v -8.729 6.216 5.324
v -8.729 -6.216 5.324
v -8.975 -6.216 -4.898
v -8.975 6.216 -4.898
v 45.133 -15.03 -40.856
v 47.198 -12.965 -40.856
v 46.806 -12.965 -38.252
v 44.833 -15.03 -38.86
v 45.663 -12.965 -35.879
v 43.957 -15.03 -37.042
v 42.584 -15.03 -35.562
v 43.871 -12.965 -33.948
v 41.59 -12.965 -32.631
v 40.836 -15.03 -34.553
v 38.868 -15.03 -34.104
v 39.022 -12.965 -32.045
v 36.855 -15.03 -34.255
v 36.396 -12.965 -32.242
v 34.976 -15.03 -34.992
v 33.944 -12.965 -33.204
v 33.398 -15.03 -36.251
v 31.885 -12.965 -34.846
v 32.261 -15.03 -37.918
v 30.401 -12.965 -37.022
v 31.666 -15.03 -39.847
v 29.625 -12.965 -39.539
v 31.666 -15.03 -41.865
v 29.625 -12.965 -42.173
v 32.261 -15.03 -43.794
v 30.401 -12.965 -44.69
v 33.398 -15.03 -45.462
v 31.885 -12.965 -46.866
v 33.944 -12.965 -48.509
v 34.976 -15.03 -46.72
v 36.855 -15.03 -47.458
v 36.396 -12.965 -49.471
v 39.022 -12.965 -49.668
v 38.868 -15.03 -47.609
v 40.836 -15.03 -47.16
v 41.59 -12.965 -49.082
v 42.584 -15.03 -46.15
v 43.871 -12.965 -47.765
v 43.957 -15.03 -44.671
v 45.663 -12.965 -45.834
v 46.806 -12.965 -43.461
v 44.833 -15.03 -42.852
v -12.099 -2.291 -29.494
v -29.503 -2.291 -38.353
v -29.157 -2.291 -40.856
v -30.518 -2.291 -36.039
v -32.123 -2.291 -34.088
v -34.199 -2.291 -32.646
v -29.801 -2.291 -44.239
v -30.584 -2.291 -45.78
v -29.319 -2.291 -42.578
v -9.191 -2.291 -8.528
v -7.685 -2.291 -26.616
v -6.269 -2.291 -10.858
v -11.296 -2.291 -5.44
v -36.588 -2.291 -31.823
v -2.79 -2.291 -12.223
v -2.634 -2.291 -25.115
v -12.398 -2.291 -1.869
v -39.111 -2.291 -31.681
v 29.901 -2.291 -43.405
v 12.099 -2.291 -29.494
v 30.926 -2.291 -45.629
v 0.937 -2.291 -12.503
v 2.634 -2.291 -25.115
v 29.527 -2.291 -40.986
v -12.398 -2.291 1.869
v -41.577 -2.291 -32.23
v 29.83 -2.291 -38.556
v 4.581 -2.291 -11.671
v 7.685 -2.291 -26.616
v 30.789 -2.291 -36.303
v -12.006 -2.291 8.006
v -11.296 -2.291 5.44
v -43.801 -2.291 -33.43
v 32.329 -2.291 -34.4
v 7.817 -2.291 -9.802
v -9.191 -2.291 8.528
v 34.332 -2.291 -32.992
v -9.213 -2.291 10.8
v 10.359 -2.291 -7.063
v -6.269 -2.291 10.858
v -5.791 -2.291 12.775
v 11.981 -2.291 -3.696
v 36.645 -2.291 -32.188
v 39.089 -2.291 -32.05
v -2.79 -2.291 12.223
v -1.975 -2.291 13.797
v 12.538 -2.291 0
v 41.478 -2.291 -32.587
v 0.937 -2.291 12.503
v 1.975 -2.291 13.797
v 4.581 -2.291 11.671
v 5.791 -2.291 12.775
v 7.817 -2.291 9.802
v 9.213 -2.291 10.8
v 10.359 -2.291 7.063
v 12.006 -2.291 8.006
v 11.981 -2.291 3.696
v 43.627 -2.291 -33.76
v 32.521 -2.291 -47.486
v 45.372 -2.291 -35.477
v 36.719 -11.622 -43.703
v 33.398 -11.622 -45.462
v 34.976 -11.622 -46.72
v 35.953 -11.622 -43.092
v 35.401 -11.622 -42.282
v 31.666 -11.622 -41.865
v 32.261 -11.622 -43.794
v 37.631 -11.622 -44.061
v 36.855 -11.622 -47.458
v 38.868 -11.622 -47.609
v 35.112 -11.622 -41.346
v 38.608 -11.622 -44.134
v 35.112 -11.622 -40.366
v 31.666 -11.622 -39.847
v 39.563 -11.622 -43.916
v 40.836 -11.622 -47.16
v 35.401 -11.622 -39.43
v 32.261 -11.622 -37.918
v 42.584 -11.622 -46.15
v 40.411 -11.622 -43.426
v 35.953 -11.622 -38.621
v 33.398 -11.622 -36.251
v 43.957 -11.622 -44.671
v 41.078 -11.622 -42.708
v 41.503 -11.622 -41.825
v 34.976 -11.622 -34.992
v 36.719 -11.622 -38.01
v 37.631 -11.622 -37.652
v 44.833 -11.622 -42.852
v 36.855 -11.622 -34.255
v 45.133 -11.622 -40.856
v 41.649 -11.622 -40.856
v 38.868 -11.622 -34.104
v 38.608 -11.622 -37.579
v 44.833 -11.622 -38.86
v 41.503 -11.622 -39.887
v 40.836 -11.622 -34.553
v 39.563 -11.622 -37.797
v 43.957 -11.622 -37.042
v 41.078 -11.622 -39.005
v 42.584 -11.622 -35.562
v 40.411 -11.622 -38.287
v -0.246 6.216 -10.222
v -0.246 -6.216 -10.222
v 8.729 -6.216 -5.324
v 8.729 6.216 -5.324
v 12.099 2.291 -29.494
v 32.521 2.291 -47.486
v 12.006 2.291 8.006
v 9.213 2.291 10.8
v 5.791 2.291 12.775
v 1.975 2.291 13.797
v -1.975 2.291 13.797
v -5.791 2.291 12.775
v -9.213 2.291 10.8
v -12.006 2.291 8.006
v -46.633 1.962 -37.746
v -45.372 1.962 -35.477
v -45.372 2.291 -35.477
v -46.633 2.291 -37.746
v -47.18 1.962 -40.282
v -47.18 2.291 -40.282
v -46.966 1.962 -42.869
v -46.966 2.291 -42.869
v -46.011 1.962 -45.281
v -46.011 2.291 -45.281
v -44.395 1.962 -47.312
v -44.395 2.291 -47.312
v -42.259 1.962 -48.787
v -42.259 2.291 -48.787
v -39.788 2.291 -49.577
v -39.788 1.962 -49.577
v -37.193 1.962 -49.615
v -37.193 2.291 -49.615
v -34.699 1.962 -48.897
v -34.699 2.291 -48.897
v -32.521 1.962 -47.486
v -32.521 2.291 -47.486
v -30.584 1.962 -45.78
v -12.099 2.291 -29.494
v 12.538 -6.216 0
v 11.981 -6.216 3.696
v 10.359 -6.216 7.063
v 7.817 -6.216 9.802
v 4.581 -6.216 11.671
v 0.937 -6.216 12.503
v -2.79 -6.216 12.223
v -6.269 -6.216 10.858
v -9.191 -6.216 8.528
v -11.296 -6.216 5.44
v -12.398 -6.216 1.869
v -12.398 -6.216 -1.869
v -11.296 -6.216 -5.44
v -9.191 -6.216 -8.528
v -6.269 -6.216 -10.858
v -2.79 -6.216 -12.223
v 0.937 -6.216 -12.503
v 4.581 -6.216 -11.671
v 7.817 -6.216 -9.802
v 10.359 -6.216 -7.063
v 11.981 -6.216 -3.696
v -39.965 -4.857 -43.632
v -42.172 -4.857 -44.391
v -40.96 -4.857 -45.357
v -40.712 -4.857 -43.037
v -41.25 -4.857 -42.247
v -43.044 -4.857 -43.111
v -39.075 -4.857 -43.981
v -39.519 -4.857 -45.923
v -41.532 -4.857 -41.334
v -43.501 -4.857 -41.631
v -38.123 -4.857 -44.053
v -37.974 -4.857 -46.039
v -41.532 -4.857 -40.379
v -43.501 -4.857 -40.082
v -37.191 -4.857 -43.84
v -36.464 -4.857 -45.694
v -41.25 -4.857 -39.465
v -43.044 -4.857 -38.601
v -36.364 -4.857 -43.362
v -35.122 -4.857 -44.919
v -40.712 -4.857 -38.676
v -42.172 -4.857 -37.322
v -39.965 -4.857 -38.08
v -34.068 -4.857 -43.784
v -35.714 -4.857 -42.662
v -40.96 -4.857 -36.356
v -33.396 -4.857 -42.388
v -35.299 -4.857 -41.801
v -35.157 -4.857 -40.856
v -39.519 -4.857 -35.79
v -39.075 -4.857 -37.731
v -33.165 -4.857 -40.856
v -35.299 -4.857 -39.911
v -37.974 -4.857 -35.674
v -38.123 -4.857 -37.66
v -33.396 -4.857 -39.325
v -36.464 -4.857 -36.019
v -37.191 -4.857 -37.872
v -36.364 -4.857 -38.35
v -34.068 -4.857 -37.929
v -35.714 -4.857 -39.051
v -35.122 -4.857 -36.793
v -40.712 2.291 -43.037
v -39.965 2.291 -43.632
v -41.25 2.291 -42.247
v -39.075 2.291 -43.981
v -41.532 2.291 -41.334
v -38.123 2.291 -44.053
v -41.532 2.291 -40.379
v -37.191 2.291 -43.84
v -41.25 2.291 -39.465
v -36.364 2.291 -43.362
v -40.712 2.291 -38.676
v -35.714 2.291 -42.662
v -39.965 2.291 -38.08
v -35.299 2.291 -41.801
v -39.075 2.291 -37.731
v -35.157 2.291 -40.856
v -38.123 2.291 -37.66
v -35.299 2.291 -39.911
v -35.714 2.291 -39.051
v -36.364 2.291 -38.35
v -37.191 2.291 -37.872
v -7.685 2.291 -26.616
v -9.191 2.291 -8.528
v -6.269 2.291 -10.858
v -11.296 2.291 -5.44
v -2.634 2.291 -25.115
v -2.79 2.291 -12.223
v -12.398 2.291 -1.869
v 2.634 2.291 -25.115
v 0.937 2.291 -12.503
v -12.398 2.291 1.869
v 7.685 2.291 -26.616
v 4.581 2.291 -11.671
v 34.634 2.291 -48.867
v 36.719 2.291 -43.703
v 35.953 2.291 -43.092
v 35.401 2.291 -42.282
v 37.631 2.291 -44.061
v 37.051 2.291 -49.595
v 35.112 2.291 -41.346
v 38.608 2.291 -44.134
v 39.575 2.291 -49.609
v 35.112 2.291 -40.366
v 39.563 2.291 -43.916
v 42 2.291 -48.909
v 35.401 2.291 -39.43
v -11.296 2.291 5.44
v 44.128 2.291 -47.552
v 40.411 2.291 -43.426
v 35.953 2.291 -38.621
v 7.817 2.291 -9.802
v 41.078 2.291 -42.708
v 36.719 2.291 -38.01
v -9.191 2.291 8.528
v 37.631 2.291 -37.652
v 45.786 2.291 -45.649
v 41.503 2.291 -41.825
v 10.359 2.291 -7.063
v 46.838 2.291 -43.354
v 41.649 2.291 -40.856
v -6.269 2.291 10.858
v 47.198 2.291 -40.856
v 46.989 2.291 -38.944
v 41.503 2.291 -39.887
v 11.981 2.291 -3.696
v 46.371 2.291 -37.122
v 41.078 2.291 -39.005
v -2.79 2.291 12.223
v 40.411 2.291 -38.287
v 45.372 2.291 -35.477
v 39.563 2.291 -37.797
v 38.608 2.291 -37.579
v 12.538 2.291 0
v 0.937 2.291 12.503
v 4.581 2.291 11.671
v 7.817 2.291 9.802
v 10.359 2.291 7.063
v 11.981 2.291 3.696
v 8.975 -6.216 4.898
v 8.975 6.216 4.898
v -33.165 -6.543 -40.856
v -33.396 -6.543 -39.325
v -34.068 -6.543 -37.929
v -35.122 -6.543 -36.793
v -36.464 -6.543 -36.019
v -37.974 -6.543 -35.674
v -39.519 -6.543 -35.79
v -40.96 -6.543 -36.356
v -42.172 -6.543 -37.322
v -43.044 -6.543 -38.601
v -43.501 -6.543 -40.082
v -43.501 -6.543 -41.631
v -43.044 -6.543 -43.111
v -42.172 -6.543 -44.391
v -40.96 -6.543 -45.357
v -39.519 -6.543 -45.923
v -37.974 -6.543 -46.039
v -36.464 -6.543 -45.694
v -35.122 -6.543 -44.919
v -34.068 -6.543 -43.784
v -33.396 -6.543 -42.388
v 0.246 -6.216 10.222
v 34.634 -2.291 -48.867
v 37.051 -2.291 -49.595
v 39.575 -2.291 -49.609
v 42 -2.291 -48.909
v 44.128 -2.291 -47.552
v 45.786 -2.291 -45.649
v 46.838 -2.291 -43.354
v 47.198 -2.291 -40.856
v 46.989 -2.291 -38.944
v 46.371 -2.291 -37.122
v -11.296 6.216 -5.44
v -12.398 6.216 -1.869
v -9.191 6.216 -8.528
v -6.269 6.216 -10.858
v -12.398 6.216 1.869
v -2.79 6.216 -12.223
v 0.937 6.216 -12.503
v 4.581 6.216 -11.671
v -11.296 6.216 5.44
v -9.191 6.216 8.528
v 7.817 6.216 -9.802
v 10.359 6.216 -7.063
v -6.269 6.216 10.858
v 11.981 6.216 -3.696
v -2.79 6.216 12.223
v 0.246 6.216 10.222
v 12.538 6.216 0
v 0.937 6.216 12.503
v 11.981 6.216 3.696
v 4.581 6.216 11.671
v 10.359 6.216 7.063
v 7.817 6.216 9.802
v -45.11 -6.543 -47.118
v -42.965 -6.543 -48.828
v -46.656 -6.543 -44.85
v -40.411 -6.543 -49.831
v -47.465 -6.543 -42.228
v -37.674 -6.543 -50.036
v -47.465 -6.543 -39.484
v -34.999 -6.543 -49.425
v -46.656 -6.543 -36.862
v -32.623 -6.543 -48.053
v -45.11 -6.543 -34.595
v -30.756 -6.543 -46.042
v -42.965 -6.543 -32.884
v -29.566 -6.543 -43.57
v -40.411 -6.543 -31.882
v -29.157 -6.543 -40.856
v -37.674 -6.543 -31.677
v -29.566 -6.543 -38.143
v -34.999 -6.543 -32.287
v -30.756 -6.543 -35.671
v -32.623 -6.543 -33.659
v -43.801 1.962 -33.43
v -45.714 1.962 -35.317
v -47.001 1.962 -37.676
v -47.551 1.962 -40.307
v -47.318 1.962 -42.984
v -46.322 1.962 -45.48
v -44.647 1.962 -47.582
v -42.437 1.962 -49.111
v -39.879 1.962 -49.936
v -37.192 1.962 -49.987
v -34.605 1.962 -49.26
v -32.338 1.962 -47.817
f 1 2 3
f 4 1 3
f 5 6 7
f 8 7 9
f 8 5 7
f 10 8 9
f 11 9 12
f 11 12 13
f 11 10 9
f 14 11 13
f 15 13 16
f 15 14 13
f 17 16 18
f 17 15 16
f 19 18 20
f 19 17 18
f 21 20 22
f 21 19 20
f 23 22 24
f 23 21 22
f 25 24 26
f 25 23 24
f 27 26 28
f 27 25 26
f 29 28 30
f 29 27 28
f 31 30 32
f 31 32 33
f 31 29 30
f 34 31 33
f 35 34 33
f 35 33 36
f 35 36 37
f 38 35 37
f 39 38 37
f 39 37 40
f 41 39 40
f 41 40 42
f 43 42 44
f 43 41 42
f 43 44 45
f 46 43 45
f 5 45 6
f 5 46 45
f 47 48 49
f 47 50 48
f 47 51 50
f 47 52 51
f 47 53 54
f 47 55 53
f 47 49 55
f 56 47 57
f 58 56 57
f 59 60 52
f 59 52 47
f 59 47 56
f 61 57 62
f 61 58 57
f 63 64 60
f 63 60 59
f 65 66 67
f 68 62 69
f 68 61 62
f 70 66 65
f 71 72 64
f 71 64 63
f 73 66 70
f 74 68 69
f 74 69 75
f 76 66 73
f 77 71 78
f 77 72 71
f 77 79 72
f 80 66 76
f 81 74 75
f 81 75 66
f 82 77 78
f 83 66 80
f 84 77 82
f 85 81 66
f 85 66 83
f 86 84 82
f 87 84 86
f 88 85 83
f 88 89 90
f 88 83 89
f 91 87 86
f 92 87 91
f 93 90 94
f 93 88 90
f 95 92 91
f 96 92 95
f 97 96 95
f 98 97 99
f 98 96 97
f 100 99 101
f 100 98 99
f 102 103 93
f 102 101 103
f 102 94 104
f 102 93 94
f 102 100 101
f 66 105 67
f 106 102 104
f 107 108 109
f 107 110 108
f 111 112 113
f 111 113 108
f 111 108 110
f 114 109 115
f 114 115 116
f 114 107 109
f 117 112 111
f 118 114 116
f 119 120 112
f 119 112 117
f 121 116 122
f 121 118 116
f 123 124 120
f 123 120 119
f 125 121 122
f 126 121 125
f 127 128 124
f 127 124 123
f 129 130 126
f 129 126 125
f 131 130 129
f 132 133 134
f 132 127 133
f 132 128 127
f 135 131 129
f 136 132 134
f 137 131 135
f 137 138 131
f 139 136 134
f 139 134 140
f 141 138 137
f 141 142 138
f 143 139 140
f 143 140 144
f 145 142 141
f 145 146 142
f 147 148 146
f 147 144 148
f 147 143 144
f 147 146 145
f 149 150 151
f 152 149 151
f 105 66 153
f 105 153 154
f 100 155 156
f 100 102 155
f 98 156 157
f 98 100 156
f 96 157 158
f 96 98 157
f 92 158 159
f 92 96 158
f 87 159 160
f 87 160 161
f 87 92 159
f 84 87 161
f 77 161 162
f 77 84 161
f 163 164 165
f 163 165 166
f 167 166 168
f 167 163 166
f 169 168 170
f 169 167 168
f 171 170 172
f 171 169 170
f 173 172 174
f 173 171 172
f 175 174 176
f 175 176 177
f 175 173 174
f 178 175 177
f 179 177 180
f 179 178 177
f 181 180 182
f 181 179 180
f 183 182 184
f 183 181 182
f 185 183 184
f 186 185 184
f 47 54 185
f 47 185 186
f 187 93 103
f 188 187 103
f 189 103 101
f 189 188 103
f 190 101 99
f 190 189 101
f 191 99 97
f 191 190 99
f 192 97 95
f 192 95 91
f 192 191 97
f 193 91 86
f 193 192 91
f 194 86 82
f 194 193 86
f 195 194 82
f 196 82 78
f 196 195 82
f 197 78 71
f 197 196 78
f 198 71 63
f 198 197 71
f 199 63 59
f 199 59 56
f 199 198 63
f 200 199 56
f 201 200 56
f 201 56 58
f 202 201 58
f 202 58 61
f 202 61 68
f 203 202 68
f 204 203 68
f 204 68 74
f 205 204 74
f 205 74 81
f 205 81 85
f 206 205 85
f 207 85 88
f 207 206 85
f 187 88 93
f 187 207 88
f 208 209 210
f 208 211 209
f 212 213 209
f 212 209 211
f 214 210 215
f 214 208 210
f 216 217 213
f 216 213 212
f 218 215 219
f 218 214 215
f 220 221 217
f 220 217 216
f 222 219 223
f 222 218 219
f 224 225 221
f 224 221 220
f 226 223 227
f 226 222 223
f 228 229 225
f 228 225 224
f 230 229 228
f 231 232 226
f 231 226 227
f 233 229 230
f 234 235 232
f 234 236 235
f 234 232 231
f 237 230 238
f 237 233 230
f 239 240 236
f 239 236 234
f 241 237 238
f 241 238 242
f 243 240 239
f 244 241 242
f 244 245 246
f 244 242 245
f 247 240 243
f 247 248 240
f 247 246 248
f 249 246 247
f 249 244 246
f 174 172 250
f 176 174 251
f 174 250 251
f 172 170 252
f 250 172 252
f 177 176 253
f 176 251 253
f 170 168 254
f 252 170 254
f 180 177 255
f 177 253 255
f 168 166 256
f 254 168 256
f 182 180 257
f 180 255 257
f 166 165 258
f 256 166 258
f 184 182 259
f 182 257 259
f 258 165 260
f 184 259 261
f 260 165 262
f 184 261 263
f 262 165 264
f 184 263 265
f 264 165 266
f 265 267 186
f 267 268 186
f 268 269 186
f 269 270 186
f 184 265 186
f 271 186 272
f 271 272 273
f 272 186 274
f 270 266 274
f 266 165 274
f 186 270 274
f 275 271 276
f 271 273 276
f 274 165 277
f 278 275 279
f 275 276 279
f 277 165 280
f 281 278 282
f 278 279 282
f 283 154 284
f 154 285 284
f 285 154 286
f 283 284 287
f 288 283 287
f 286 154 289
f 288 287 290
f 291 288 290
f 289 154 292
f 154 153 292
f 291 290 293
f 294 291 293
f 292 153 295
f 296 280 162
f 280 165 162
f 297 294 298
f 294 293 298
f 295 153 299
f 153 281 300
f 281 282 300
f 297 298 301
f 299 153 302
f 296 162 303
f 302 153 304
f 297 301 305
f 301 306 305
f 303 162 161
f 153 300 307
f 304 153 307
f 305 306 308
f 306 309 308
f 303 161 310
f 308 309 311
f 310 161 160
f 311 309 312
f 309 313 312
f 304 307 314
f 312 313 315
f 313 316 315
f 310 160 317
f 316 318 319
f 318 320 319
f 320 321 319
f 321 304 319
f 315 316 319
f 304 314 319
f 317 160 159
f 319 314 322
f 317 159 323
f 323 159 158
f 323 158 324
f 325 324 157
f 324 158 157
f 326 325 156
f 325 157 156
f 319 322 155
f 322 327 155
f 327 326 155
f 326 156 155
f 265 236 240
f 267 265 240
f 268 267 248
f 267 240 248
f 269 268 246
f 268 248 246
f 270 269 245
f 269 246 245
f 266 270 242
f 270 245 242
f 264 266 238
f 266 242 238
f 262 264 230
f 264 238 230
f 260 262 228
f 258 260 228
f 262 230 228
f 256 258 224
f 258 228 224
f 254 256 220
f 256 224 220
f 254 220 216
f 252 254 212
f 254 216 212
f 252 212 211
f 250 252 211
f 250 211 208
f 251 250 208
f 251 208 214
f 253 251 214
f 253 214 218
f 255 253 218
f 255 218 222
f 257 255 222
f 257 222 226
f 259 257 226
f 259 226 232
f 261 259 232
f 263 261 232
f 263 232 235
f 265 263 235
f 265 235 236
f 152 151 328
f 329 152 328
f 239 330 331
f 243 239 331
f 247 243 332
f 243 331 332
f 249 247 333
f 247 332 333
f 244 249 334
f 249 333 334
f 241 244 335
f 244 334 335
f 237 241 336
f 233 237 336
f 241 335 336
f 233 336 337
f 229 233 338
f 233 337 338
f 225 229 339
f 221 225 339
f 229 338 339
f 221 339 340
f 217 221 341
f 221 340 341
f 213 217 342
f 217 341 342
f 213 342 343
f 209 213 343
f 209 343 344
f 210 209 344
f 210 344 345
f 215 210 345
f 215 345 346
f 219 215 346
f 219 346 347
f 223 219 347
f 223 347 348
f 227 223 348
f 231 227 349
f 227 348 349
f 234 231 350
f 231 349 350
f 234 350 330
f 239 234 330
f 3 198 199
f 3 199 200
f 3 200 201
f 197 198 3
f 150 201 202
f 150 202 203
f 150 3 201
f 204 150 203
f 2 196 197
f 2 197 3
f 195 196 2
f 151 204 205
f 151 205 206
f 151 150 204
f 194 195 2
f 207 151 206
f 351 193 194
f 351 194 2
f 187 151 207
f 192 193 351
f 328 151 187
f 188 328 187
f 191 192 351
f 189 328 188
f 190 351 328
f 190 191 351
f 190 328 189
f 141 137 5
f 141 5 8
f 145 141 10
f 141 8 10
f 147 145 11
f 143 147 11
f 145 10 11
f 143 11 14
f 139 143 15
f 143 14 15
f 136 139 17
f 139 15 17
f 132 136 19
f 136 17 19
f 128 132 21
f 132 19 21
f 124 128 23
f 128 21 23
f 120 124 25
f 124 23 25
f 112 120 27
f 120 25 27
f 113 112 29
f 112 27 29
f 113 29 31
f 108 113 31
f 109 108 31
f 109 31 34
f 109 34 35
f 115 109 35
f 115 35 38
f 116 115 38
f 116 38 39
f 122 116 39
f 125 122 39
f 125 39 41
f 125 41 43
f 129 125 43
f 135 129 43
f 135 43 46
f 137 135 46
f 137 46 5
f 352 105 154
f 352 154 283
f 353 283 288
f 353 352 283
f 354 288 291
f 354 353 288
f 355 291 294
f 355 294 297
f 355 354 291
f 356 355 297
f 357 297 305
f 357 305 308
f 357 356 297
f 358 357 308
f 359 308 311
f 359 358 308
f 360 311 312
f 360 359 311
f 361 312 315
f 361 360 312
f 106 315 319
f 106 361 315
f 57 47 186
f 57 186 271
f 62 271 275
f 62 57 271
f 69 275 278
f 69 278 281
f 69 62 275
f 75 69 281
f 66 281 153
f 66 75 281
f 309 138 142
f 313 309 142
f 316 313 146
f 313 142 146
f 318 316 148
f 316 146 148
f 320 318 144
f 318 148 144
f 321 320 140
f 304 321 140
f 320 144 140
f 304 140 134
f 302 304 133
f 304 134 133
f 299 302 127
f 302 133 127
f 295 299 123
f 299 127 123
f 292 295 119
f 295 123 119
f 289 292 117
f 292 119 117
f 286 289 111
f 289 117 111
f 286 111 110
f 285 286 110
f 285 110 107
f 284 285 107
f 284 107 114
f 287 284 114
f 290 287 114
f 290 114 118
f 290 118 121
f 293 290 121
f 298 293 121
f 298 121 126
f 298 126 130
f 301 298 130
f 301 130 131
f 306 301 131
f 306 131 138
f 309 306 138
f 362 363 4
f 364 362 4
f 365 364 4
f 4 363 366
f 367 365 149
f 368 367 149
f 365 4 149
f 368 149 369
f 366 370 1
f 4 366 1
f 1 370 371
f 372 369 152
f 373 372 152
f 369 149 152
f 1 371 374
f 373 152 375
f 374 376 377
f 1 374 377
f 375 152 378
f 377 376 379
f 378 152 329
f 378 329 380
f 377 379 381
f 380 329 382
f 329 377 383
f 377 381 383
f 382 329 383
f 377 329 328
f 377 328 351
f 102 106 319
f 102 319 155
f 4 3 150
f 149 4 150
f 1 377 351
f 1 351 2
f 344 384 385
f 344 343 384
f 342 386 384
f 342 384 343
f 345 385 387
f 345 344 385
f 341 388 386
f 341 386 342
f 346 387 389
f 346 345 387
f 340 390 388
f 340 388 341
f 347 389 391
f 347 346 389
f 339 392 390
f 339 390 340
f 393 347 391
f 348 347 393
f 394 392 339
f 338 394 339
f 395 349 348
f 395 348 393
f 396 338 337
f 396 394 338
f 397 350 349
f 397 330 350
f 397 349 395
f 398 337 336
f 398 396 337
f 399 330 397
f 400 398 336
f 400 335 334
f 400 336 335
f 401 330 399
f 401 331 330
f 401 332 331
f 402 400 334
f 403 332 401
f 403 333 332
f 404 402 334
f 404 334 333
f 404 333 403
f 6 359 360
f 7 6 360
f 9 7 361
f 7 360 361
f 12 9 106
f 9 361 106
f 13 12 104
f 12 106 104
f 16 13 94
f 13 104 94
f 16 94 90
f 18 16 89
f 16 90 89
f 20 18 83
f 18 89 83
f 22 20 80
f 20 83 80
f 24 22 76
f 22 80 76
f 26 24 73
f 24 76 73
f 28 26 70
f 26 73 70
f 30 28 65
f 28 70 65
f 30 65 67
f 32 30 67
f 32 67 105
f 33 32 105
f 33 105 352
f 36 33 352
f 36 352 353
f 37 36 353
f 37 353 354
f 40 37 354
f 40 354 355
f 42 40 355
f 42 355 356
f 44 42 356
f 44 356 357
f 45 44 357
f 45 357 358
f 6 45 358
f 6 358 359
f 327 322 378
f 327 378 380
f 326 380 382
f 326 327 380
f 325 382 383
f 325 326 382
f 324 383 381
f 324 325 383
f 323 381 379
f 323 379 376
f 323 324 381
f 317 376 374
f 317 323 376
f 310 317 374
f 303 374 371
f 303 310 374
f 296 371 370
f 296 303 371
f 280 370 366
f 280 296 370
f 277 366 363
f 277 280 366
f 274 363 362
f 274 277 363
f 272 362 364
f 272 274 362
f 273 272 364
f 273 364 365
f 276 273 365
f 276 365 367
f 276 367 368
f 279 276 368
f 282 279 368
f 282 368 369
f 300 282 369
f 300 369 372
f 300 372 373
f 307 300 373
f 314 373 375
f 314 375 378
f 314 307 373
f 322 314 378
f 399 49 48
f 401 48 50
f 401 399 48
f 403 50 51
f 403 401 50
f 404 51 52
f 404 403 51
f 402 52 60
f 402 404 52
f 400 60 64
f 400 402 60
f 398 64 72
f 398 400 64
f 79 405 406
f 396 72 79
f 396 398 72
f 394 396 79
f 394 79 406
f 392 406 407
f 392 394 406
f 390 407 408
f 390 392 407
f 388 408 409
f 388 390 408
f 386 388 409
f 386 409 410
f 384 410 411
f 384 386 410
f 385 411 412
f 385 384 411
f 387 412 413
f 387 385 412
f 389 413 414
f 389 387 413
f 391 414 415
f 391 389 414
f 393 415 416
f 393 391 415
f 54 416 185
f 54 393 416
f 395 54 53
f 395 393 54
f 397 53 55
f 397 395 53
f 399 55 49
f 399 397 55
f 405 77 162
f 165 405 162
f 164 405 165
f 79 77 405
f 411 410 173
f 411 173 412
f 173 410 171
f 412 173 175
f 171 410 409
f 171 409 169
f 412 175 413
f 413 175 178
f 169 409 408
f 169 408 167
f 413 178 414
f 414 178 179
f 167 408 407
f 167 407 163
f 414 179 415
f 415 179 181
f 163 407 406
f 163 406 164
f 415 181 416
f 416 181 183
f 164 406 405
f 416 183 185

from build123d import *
from build123d import SkipClean  # not in build123d's __all__

# Parameters (mm, degrees)
F0_R      = 12.5377374601
F1_DEPTH  = 6.21636
F3_DEPTH  = 43.11412
F5_DEPTH  = 2.29052
F6_R      = 9.2054650922
F7_DEPTH  = 4.2521
F8_R      = 8.8363001854
F9_DEPTH  = 13.21401
F10_R     = 3.2055120306
F11_DEPTH = 28.79148
F12_R     = 5.1967625573
F13_DEPTH = 1.68604
F14_R     = 3.2868447942
F15_DEPTH = 33.07979
F16_R     = 6.7713245086
F17_DEPTH = 3.883
F20_DEPTH = 42.80702
F22_DEPTH = 12.5


# Not quite as in the source:
# - a fillet or chamfer that OpenCascade refuses, or shapes differently, is made with other operations: its cross-section is extruded or revolved along the edge and cut away or added
# - after a boolean that leaves OpenCascade's solid faulty, fix() repairs it


with BuildPart() as f1:
    # F0 (on Front) → F1 (new body, symmetric)
    with BuildSketch(Plane.XZ):
        Circle(F0_R)
    extrude(amount=F1_DEPTH, both=True)

    # F2 (on face) → F3 (cut)
    with BuildSketch(Plane.XZ.offset(6.21636)):
        Polygon((-1.5670347233, 8.3723281259), (-8.0341662075, 2.8290721839), (-6.4671314842, -5.5432559419), (1.5670347233, -8.3723281259), (8.0341662075, -2.8290721839), (6.4671314842, 5.5432559419), align=None)
    extrude(amount=-F3_DEPTH, mode=Mode.SUBTRACT)

    # F4 (on Front) → F5 (join, symmetric)
    with BuildSketch(Plane.XZ):
        with BuildLine():
            ThreePointArc((-32.5207371804, -47.4863935268), (-30.3092801317, -44.4938571079), (-29.5258178112, -40.8562750417))
            ThreePointArc((-29.5258178112, -40.8562750417), (-35.5217487699, -32.4889275753), (-45.3723830373, -35.4770199791))
            ThreePointArc((-45.3723830373, -35.4770199791), (-44.3951798921, -47.3124631688), (-32.5207371804, -47.4863935268))
        make_face()
        with BuildLine():
            ThreePointArc((-45.3723830373, -35.4770199791), (-35.5217487699, -32.4889275753), (-29.5258178112, -40.8562750417))
            ThreePointArc((-29.5258178112, -40.8562750417), (-30.3092801317, -44.4938571079), (-32.5207371804, -47.4863935268))
            Line((-32.5207371804, -47.4863935268), (-12.0985076262, -29.4936502279))
            ThreePointArc((-12.0985076262, -29.4936502279), (0, -24.9242672402), (12.0985076262, -29.4936502279))
            Line((12.0985076262, -29.4936502279), (32.5207371804, -47.4863935268))
            ThreePointArc((32.5207371804, -47.4863935268), (32.3290561012, -34.4000869145), (45.3723830373, -35.4770199791))
            Line((45.3723830373, -35.4770199791), (12.0060265403, 8.0061388902))
            ThreePointArc((12.0060265403, 8.0061388902), (0, 13.9267959918), (-12.0060265403, 8.0061388902))
            Line((-12.0060265403, 8.0061388902), (-45.3723830373, -35.4770199791))
        make_face()
        with BuildLine():
            ThreePointArc((47.1984181821, -40.8562750417), (46.729465463, -38.0159058149), (45.3723830373, -35.4770199791))
            ThreePointArc((45.3723830373, -35.4770199791), (32.3290561012, -34.4000869145), (32.5207371804, -47.4863935268))
            ThreePointArc((32.5207371804, -47.4863935268), (41.9997000629, -48.9091129066), (47.1984181821, -40.8562750417))
        make_face()
    extrude(amount=F5_DEPTH, both=True)

    # F6 (on face) → F7 (join, symmetric)
    with BuildSketch(Plane.XZ.offset(2.29052)):
        with Locations((-38.3621179966, -40.8562750417)):
            Circle(F6_R)
    extrude(amount=F7_DEPTH, both=True)

    # F8 (on face) → F9 (join)
    with BuildSketch(Plane.XZ.offset(2.29052)):
        with Locations((38.3621179966, -40.8562750417)):
            Circle(F8_R)
    with SkipClean():  # cleaning this boolean's faces spoils the solid; the shape is the same uncleaned
        extrude(amount=F9_DEPTH)

    # F10 (on face) → F11 (cut)
    with BuildSketch(Plane.XZ.offset(6.54262)):
        with Locations((-38.3621179966, -40.8562750417)):
            Circle(F10_R)
    extrude(amount=-F11_DEPTH, mode=Mode.SUBTRACT)

    add(f1.part.fix(), mode=Mode.REPLACE)

    # F12 (on face) → F13 (cut)
    with BuildSketch(Plane.XZ.offset(6.54262)):
        with Locations((-38.3621179966, -40.8562750417)):
            Circle(F12_R)
    extrude(amount=-F13_DEPTH, mode=Mode.SUBTRACT)

    # F14 (on face) → F15 (cut)
    with BuildSketch(Plane.XZ.offset(15.50453)):
        with Locations((38.3621179966, -40.8562750417)):
            Circle(F14_R)
    extrude(amount=-F15_DEPTH, mode=Mode.SUBTRACT)

    # F16 (on face) → F17 (cut)
    with BuildSketch(Plane.XZ.offset(15.50453)):
        with Locations((38.3621179966, -40.8562750417)):
            Circle(F16_R)
    extrude(amount=-F17_DEPTH, mode=Mode.SUBTRACT)

    # F18: chamfer of 2.54 on 1 edges, made by hand

    # F18_s1 → F18_t2 (revolve, cut)
    with BuildSketch(Plane.XY.offset(-40.8562750417)):
        Polygon((47.1984181821, -12.96453), (44.6584181821, -15.50453), (47.1984181821, -15.50453), align=None)
    revolve(axis=Axis((38.3621179966, -15.50453, -40.8562750417), (0, -1, 0)), mode=Mode.SUBTRACT)

    # F19 (on face) → F20 (cut)
    with BuildSketch(Plane.XZ.offset(2.29052)):
        Polygon((7.5046534745, -4.3328137037), (7.5046534745, 4.3328137037), (0, 8.6656274074), (-7.5046534745, 4.3328137037), (-7.5046534745, -4.3328137037), (0, -8.6656274074), align=None)
    extrude(amount=-F20_DEPTH, mode=Mode.SUBTRACT)

    # F21 (on Front) → F22 (cut, symmetric)
    with BuildSketch(Plane.XZ):
        Polygon((8.97537597, 4.8977579377), (0.2461051893, 10.2217825674), (-8.7292707806, 5.3240246297), (-8.97537597, -4.8977579377), (-0.2461051893, -10.2217825674), (8.7292707806, -5.3240246297), align=None)
    extrude(amount=F22_DEPTH, both=True, mode=Mode.SUBTRACT)


solid = f1.part
